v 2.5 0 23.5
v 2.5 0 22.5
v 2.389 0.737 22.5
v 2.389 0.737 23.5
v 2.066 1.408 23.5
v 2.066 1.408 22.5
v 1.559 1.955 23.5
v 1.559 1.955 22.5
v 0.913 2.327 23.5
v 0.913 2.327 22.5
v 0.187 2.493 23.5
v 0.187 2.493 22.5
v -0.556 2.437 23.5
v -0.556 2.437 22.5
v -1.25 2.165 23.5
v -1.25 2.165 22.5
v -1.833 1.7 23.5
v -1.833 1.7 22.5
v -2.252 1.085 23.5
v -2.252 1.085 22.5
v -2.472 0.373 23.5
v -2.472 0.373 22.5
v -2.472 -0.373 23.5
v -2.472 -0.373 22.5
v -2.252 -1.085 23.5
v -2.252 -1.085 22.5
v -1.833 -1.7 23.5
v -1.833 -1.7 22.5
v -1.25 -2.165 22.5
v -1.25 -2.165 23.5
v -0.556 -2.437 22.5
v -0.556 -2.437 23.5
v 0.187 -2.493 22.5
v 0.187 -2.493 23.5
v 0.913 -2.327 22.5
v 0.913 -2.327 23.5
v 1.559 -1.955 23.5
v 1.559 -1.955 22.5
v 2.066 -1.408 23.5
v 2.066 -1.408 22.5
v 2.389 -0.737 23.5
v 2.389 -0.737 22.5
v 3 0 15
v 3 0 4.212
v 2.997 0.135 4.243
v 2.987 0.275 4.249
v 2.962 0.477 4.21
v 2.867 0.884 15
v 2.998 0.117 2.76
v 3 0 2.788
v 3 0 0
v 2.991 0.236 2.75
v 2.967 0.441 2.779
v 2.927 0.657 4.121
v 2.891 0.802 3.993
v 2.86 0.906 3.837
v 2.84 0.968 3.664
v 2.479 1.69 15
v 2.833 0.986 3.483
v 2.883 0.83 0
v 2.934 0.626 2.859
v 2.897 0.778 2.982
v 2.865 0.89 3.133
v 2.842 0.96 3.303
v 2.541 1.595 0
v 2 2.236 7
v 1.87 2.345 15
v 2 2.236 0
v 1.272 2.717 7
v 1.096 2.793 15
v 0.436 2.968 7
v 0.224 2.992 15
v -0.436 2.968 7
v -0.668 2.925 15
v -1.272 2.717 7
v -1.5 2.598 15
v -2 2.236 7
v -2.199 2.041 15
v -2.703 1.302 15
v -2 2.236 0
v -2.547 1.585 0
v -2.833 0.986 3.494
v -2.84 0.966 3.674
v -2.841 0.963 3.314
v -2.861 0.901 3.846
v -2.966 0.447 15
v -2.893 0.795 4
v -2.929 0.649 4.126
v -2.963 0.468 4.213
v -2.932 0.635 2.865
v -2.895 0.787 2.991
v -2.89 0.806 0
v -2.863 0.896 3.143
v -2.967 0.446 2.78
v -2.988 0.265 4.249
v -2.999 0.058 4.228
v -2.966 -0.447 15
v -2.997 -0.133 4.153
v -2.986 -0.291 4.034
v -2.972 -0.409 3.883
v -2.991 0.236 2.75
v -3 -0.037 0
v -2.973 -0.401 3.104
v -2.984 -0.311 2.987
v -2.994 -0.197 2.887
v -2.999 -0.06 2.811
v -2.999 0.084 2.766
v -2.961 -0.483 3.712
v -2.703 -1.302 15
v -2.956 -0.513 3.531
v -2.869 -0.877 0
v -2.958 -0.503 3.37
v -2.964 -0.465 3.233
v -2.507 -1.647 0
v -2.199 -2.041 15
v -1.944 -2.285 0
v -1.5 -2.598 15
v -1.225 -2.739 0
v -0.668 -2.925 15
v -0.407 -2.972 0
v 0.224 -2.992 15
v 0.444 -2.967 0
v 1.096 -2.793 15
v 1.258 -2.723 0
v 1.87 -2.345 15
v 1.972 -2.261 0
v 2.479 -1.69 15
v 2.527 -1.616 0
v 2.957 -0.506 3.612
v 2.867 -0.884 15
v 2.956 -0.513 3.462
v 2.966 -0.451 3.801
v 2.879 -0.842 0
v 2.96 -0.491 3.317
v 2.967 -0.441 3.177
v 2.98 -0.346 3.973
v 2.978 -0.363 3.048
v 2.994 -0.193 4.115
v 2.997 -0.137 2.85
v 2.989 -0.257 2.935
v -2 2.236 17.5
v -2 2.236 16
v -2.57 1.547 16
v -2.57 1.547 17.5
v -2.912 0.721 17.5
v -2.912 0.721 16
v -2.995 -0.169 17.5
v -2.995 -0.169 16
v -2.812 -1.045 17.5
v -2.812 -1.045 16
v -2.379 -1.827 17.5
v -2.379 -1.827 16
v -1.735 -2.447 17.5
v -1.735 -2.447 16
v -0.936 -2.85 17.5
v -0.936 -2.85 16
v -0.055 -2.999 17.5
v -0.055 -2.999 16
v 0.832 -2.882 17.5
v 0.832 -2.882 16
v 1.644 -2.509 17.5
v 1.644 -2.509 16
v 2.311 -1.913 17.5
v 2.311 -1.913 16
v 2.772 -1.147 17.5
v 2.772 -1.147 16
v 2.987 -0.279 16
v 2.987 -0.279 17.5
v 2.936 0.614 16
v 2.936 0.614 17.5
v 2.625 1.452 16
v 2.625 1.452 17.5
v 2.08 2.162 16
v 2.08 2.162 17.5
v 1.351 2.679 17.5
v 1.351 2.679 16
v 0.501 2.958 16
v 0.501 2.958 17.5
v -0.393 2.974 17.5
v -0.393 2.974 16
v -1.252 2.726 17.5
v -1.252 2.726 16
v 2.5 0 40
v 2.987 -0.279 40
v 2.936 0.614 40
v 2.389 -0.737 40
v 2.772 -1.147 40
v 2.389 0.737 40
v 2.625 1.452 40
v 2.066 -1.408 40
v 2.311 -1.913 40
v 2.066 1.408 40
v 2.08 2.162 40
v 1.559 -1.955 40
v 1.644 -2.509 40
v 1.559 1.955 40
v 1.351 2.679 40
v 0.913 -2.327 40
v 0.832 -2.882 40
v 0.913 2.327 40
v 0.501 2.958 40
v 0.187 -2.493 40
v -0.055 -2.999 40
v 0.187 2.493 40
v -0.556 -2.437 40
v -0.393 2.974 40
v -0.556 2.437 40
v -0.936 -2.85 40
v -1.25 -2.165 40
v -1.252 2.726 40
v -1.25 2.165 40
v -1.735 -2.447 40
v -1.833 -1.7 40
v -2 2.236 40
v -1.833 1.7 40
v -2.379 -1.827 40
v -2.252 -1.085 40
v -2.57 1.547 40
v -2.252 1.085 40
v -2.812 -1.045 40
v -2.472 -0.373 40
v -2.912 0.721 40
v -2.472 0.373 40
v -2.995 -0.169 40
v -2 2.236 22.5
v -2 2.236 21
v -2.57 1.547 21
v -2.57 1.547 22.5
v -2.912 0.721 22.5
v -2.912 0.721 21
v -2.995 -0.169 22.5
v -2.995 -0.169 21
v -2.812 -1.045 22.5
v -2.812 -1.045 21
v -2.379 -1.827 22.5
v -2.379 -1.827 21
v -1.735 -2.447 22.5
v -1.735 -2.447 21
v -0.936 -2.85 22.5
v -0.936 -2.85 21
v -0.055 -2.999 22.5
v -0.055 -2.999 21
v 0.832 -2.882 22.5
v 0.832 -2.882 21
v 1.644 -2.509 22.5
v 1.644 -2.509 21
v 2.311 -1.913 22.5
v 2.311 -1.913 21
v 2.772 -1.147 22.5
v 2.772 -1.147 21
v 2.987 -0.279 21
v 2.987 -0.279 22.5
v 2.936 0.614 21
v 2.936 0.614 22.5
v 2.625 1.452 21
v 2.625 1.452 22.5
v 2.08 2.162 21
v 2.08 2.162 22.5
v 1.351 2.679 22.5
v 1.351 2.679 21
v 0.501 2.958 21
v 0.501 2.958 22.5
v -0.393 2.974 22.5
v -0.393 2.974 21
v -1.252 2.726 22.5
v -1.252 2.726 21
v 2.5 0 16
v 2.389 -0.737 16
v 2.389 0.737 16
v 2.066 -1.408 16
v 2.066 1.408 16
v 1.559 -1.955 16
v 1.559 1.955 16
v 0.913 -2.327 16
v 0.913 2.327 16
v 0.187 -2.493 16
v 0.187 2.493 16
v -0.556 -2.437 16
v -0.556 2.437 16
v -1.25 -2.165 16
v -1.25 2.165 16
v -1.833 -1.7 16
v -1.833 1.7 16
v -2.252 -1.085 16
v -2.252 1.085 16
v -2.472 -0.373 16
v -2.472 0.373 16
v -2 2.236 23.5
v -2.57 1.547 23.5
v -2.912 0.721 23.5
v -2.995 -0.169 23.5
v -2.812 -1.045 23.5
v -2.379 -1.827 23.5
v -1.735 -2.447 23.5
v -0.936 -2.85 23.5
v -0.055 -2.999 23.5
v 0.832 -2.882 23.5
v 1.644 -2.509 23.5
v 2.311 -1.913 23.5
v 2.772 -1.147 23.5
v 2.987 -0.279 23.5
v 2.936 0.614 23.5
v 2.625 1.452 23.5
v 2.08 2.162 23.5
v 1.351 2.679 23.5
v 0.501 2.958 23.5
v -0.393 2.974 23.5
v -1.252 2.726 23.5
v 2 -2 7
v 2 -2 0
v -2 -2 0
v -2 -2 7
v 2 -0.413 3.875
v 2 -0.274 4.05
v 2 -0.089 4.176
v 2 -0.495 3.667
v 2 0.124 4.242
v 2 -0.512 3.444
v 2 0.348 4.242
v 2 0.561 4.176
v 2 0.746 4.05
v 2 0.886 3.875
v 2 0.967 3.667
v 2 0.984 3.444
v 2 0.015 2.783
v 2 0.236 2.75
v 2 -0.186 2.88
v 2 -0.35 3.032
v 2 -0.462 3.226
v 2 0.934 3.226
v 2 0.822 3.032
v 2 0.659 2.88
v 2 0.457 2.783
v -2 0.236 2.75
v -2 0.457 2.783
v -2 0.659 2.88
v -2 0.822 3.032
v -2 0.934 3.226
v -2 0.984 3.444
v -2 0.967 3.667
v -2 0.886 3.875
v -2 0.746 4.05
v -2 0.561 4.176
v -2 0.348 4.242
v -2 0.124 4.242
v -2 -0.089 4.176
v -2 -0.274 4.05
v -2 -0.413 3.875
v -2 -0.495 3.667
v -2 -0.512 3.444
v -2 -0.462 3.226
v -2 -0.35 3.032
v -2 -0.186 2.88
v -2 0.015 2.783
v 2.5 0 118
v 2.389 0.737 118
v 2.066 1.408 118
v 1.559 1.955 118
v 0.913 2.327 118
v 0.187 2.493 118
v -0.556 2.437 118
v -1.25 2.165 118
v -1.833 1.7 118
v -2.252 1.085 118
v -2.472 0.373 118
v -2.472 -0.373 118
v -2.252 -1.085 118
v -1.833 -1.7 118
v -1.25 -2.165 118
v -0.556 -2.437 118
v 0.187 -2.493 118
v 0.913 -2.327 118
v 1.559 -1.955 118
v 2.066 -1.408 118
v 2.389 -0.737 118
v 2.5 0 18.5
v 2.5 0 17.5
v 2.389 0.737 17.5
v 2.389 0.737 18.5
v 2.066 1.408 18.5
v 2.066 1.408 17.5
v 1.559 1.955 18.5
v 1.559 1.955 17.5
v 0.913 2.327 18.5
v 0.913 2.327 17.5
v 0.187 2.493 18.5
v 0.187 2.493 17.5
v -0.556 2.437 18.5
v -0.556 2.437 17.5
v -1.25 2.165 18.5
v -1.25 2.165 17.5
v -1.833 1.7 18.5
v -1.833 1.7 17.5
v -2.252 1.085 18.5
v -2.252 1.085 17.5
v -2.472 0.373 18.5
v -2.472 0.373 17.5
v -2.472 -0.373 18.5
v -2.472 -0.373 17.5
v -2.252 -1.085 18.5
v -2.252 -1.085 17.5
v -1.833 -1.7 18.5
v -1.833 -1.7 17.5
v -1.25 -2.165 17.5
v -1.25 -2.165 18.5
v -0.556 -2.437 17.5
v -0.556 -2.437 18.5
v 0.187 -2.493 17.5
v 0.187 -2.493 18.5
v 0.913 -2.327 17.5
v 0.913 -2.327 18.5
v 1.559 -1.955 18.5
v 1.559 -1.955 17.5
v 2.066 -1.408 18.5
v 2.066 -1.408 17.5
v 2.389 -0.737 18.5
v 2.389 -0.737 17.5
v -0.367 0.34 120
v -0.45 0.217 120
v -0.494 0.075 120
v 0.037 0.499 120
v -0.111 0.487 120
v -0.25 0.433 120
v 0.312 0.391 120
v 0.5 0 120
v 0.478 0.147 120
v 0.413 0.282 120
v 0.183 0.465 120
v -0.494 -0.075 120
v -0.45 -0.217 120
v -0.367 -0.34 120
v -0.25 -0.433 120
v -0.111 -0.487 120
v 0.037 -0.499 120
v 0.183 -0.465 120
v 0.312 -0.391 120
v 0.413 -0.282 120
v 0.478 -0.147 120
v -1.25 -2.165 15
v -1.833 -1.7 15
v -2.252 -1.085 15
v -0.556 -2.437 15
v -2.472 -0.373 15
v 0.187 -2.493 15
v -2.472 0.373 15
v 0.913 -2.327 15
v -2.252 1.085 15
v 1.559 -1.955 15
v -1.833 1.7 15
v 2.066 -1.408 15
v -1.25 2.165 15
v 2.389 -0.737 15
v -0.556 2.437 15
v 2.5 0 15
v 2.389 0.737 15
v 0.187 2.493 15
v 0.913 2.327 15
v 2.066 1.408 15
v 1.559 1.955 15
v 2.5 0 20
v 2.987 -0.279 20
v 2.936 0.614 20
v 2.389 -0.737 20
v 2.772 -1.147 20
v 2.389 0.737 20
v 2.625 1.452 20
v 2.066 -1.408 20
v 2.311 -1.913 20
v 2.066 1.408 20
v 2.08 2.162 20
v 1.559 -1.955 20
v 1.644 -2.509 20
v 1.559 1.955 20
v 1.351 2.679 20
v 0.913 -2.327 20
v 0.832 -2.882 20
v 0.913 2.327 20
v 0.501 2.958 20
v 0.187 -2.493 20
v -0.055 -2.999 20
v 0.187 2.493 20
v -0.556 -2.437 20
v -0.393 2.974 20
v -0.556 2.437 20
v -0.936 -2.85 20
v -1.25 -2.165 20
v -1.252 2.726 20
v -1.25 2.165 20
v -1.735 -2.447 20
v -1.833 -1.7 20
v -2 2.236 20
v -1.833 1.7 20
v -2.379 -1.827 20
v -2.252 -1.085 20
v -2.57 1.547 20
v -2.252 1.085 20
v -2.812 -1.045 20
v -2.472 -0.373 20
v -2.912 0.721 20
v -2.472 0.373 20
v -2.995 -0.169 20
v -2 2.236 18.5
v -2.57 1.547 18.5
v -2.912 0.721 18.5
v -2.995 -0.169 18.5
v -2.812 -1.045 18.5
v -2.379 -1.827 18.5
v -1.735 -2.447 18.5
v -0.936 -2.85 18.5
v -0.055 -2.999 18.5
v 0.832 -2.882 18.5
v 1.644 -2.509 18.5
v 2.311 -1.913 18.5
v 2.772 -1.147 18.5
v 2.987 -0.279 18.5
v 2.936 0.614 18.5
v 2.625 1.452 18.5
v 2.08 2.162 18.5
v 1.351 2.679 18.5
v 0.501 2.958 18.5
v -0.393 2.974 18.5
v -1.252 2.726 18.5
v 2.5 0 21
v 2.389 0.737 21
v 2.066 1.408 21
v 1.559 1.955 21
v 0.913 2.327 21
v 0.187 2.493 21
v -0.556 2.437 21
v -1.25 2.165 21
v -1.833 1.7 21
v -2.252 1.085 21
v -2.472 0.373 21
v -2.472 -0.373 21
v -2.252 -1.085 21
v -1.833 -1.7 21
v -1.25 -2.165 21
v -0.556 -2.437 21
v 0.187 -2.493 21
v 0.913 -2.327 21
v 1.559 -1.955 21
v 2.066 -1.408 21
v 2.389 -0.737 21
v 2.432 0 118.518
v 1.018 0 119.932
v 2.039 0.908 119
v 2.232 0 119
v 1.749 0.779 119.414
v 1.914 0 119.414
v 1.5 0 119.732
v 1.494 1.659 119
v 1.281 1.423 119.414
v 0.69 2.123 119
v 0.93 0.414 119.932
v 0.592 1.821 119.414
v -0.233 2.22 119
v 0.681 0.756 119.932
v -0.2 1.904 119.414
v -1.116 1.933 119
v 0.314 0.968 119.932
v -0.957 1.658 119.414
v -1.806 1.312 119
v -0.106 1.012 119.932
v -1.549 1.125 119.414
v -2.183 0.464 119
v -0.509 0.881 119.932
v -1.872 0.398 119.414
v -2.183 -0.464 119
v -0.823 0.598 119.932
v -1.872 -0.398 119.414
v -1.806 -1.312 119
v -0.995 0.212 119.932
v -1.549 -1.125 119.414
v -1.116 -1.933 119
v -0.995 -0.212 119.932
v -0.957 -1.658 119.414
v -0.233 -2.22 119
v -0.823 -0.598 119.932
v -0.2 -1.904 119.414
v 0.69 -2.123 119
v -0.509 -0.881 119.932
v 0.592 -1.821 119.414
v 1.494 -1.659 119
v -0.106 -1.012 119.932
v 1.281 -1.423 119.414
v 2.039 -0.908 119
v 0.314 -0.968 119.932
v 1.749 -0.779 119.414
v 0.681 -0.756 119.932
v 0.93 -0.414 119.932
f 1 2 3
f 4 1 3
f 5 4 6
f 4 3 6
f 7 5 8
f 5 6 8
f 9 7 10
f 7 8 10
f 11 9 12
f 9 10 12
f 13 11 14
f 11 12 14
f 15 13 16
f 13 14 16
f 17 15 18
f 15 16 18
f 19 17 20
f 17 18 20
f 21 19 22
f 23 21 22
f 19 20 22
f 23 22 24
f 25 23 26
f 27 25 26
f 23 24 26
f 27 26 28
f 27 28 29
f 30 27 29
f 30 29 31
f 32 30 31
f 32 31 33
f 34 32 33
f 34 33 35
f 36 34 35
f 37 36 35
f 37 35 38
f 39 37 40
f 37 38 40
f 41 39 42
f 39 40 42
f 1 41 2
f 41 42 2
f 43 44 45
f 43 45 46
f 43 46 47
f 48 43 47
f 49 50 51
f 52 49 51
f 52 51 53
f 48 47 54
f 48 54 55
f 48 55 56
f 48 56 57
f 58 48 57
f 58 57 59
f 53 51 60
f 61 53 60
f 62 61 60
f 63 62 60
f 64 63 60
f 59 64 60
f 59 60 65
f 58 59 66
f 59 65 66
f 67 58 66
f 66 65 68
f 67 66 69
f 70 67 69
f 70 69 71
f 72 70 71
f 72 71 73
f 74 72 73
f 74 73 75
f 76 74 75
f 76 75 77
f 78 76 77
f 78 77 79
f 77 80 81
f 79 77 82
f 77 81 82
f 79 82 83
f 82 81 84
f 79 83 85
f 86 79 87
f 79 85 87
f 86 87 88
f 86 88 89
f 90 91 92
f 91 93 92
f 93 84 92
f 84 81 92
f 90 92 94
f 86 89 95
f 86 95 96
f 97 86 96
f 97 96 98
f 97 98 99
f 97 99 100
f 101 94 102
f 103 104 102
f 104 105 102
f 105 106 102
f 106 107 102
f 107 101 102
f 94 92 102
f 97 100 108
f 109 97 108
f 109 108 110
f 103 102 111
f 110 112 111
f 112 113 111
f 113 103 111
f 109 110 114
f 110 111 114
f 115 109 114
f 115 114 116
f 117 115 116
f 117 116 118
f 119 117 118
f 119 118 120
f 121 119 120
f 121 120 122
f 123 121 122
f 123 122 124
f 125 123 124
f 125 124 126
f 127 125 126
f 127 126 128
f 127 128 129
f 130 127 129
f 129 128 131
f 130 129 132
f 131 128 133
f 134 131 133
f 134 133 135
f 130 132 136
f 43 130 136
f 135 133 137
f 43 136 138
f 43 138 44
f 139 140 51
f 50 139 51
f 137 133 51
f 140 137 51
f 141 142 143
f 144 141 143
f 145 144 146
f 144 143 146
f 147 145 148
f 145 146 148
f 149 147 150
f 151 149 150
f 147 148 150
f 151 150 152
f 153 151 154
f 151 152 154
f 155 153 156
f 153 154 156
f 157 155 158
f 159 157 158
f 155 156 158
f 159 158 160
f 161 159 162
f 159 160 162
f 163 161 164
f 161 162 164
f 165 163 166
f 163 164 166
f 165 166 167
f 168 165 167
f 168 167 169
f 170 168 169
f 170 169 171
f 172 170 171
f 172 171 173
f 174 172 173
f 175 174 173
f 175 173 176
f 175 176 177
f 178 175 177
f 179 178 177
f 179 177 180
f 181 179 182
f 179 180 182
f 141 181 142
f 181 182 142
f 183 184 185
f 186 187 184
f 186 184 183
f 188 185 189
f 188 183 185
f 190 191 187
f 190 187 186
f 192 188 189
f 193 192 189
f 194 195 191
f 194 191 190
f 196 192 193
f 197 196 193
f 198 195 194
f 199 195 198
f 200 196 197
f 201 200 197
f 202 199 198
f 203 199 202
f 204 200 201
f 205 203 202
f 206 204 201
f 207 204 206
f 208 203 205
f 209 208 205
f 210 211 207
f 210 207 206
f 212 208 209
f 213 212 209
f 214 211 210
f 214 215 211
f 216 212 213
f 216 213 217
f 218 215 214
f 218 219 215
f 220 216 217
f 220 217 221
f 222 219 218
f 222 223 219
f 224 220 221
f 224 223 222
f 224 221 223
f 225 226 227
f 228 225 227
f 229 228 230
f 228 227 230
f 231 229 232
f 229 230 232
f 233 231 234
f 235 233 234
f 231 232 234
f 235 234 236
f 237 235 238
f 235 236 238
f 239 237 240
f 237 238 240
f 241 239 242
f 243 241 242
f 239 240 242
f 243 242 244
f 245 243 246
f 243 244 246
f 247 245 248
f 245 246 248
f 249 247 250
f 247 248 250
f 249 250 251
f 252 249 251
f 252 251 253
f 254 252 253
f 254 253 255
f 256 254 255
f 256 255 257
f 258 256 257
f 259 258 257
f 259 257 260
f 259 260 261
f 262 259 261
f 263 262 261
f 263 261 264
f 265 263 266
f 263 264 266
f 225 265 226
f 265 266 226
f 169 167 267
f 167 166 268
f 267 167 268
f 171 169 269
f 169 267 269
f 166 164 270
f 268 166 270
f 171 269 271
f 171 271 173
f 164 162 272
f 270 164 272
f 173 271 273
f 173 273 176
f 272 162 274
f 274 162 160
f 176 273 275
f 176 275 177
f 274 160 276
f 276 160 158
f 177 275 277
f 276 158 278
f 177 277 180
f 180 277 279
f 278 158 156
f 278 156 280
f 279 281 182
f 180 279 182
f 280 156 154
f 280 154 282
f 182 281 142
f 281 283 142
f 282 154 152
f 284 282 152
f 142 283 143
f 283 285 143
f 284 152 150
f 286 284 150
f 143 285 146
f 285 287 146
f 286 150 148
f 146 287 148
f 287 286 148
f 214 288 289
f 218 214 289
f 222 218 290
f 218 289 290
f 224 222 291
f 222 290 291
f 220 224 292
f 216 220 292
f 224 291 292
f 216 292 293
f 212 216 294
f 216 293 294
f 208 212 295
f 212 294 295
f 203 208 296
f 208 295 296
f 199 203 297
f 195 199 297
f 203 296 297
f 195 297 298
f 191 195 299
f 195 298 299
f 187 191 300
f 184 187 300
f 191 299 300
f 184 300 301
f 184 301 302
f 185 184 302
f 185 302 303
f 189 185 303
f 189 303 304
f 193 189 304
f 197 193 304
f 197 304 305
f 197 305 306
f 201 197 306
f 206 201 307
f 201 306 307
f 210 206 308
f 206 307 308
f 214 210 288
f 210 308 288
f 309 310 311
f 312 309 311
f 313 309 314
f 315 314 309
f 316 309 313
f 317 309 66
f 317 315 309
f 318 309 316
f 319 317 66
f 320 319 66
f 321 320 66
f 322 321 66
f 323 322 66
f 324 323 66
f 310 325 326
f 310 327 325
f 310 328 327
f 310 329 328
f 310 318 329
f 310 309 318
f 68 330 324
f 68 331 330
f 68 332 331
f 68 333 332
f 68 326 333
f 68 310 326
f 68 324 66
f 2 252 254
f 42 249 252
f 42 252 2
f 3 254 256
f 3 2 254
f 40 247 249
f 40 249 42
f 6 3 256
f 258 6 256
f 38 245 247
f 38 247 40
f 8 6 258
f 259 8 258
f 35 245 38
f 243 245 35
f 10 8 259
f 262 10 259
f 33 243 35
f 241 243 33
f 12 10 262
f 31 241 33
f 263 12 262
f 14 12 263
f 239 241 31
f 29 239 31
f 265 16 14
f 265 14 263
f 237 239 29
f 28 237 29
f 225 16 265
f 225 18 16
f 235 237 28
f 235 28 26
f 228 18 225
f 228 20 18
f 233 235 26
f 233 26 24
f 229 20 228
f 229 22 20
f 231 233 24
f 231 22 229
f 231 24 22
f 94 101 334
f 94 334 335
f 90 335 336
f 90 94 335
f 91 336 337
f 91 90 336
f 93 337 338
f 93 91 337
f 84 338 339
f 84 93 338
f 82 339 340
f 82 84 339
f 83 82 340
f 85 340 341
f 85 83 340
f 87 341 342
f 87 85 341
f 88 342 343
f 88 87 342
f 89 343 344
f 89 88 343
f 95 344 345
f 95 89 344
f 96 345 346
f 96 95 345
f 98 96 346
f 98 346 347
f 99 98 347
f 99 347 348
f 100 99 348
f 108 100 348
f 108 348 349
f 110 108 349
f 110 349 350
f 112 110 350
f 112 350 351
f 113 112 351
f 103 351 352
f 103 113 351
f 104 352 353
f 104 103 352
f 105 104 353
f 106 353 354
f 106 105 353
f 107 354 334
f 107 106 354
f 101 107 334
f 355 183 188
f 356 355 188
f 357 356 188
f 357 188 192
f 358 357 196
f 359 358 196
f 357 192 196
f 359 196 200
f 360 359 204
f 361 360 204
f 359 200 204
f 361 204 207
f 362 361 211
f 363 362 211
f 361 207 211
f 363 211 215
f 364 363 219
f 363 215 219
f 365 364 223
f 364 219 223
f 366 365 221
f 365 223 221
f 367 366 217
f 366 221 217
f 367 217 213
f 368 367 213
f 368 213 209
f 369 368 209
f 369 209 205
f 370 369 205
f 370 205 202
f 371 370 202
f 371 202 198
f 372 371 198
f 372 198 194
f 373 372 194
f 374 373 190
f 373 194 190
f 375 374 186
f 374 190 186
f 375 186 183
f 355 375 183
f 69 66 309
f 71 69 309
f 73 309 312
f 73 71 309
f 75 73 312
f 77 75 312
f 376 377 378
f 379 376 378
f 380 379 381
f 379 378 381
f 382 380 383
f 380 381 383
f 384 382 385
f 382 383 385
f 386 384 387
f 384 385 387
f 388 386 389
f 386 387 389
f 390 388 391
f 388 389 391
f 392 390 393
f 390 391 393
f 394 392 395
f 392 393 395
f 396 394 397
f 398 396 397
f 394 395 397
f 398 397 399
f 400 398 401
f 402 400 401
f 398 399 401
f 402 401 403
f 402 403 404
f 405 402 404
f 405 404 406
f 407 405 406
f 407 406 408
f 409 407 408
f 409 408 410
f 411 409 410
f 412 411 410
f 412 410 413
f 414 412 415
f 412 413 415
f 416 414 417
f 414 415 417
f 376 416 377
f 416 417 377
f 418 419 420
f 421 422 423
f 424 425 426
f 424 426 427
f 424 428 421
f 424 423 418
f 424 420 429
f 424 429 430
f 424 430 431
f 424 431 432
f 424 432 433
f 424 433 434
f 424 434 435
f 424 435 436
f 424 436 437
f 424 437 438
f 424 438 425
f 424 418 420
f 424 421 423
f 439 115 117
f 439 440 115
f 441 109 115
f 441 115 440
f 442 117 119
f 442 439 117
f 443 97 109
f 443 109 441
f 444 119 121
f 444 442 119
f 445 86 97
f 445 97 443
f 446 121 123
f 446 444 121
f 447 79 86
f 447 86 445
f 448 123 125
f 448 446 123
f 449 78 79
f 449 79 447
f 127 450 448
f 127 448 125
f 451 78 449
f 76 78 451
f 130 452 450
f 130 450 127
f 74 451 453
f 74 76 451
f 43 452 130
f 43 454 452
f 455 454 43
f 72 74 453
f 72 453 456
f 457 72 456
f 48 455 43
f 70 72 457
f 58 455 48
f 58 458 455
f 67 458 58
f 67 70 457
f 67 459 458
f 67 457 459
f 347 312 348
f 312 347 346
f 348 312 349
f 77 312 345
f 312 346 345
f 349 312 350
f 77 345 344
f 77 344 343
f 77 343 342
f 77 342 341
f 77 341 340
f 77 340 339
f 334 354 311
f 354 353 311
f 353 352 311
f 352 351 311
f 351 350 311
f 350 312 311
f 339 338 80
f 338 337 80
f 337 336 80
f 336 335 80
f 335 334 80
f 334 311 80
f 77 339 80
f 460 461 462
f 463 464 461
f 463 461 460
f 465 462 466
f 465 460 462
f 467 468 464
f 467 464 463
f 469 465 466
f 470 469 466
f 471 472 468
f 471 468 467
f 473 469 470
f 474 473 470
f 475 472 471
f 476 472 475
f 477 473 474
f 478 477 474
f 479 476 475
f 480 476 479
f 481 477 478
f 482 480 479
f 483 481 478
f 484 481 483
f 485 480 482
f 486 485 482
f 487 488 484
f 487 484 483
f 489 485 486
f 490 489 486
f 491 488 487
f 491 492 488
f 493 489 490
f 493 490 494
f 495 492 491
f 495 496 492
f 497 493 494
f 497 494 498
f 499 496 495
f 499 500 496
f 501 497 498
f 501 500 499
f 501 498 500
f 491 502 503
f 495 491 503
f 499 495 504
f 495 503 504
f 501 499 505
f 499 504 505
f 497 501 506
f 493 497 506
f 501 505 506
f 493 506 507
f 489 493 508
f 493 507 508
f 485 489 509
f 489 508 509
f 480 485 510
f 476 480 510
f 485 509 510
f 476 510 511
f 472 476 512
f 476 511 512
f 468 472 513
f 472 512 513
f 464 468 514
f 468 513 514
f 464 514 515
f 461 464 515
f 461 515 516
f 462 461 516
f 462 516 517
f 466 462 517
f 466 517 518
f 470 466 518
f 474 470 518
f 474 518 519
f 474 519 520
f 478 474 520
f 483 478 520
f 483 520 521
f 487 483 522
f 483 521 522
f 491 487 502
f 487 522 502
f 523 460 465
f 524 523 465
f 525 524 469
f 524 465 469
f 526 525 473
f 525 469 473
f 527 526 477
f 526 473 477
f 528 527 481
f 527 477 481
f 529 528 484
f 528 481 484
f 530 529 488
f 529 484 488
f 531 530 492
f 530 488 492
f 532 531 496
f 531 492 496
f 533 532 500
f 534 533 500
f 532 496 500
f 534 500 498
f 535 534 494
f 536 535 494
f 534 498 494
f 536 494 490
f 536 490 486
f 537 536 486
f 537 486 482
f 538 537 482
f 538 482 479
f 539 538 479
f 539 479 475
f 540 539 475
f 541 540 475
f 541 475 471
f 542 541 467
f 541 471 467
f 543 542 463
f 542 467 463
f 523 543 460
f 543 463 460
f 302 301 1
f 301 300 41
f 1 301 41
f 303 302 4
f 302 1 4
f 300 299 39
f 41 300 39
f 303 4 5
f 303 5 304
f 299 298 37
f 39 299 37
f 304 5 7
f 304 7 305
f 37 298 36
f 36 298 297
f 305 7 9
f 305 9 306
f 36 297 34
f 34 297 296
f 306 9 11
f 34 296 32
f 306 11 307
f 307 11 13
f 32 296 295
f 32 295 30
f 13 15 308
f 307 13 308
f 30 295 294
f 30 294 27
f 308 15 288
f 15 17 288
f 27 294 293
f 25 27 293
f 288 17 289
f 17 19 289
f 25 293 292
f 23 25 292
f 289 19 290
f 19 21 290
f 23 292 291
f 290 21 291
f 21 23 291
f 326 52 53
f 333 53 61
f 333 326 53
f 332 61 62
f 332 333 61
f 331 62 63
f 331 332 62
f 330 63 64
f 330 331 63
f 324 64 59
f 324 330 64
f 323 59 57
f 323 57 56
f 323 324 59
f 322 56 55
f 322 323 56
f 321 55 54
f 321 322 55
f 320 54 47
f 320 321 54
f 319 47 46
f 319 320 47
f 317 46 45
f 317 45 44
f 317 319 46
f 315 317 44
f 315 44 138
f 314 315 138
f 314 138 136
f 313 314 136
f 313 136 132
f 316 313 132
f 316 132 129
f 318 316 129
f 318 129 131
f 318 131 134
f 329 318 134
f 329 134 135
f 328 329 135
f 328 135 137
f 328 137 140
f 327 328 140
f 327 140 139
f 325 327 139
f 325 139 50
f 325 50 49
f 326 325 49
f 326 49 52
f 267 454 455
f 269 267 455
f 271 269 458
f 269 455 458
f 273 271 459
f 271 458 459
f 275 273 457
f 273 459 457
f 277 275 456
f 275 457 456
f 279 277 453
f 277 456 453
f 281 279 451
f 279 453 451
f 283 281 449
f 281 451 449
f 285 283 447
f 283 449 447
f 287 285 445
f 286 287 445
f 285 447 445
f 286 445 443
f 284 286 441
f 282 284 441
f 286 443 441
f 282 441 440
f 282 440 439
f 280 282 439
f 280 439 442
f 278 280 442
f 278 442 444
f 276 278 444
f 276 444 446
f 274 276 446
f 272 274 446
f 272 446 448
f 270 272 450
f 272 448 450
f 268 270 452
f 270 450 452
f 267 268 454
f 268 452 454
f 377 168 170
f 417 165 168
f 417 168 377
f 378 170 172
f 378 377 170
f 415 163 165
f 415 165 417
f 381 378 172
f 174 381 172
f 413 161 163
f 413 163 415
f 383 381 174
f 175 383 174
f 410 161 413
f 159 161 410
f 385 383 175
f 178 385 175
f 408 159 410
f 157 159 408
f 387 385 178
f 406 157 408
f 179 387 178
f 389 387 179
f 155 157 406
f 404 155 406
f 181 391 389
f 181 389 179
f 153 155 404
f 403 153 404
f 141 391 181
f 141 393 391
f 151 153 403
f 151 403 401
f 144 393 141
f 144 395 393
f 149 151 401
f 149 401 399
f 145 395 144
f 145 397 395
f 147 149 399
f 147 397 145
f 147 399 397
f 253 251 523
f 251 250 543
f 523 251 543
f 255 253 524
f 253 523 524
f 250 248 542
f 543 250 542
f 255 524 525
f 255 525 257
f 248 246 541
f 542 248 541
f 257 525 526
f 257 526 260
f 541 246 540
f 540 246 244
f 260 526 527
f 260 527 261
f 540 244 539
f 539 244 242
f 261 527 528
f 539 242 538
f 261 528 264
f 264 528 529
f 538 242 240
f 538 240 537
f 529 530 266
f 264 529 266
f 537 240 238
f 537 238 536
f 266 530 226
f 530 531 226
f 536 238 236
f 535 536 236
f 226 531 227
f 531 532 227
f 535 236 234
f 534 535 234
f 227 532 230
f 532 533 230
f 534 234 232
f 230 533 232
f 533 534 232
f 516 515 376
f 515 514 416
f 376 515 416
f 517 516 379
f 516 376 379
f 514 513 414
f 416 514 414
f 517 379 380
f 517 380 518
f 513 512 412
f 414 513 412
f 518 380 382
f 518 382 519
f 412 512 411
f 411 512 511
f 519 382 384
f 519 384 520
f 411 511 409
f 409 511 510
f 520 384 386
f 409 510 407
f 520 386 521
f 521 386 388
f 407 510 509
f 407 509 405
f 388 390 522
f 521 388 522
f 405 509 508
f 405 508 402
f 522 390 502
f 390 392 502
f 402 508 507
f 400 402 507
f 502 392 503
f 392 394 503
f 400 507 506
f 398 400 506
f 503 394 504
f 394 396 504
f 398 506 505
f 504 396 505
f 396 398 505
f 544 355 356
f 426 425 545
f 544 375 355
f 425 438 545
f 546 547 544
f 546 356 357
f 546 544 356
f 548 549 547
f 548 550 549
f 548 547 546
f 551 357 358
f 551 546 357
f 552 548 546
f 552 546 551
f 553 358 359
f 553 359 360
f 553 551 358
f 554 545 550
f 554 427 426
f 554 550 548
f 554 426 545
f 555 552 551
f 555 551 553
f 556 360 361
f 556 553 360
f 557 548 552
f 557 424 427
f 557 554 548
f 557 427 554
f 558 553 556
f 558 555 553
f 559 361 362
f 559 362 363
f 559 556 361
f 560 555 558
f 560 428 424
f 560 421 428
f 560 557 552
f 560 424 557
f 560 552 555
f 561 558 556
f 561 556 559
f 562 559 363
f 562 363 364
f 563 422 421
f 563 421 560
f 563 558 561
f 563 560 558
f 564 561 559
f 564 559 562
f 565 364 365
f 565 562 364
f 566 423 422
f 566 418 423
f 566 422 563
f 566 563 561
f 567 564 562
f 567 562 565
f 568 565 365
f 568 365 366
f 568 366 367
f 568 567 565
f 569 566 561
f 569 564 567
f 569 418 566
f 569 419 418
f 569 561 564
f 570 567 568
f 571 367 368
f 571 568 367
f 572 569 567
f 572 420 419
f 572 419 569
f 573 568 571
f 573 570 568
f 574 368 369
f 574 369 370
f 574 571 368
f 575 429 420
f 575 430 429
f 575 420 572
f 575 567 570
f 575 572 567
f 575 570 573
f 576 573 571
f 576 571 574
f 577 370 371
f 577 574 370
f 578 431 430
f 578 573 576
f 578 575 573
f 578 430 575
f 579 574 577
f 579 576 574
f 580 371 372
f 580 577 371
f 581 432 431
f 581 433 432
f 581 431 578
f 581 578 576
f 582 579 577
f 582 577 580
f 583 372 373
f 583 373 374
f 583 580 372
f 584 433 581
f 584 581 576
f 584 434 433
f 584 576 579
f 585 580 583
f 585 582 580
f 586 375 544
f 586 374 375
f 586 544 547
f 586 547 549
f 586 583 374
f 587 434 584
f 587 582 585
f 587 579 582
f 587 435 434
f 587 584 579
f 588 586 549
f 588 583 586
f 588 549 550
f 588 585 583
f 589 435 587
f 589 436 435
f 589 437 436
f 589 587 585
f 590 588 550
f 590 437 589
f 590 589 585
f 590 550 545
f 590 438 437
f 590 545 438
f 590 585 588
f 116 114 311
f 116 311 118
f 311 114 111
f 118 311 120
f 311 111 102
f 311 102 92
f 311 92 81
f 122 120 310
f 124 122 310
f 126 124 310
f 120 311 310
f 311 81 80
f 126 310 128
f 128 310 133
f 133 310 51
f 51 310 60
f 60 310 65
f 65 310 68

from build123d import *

# Parameters (mm, degrees)
SKETCH2_R               = 3
BOSS_EXTRUDE1_DEPTH     = 15
SKETCH3_W               = 4
SKETCH3_H               = 5.183202584
CUT_EXTRUDE1_DEPTH      = 7
CUT_EXTRUDE4_DEPTH      = 6
CUT_EXTRUDE4_DEPTH_BACK = 3
SKETCH4_R               = 0.75
SKETCH12_R              = 2.5
BOSS_EXTRUDE2_DEPTH     = 1
SKETCH13_R              = 3
BOSS_EXTRUDE3_DEPTH     = 1.5
SKETCH14_R              = 2.5
BOSS_EXTRUDE4_DEPTH     = 1
SKETCH15_R              = 3
BOSS_EXTRUDE5_DEPTH     = 1.5
SKETCH16_R              = 2.5
BOSS_EXTRUDE6_DEPTH     = 1
SKETCH17_R              = 3
BOSS_EXTRUDE7_DEPTH     = 1.5
SKETCH18_R              = 2.5
BOSS_EXTRUDE8_DEPTH     = 1
SKETCH19_R              = 3
BOSS_EXTRUDE9_DEPTH     = 16.5
SKETCH28_R              = 2.5
BOSS_EXTRUDE11_DEPTH    = 80
FILLET6_R               = 2


with BuildPart() as part:
    # Sketch2 → Boss-Extrude1 (new body)
    with BuildSketch(Plane.XY):
        Circle(SKETCH2_R)
    extrude(amount=BOSS_EXTRUDE1_DEPTH)

    # Sketch3 → Cut-Extrude1 (cut)
    with BuildSketch(Plane(origin=(0, 0, 0), x_dir=(-1, 0, 0), z_dir=(0, 0, -1))):
        with Locations((0, 0.591601292)):
            Rectangle(SKETCH3_W, SKETCH3_H)
    extrude(amount=-CUT_EXTRUDE1_DEPTH, mode=Mode.SUBTRACT)

    # Sketch4 → Cut-Extrude4 (cut, two sides: drawn at the far end of the back side and taken through both)
    with BuildSketch(Plane(origin=(-2, 0, 0), x_dir=(0, 0, -1), z_dir=(1, 0, 0)).offset(-CUT_EXTRUDE4_DEPTH_BACK)):
        with Locations((-3.5, 0.236067977)):
            Circle(SKETCH4_R)
    extrude(amount=CUT_EXTRUDE4_DEPTH + CUT_EXTRUDE4_DEPTH_BACK, mode=Mode.SUBTRACT)

    # Sketch12 → Boss-Extrude2 (add)
    with BuildSketch(Plane.XY.offset(15)):
        Circle(SKETCH12_R)
    extrude(amount=BOSS_EXTRUDE2_DEPTH)

    # Sketch13 → Boss-Extrude3 (add)
    with BuildSketch(Plane.XY.offset(16)):
        with Locations(Location((0, 0, 0), (0, 0, 131.810314896))):
            Circle(SKETCH13_R)
    extrude(amount=BOSS_EXTRUDE3_DEPTH)

    # Sketch14 → Boss-Extrude4 (add)
    with BuildSketch(Plane.XY.offset(17.5)):
        Circle(SKETCH14_R)
    extrude(amount=BOSS_EXTRUDE4_DEPTH)

    # Sketch15 → Boss-Extrude5 (add)
    with BuildSketch(Plane.XY.offset(18.5)):
        with Locations(Location((0, 0, 0), (0, 0, 131.810314896))):
            Circle(SKETCH15_R)
    extrude(amount=BOSS_EXTRUDE5_DEPTH)

    # Sketch16 → Boss-Extrude6 (add)
    with BuildSketch(Plane.XY.offset(20)):
        Circle(SKETCH16_R)
    extrude(amount=BOSS_EXTRUDE6_DEPTH)

    # Sketch17 → Boss-Extrude7 (add)
    with BuildSketch(Plane.XY.offset(21)):
        with Locations(Location((0, 0, 0), (0, 0, 131.810314896))):
            Circle(SKETCH17_R)
    extrude(amount=BOSS_EXTRUDE7_DEPTH)

    # Sketch18 → Boss-Extrude8 (add)
    with BuildSketch(Plane.XY.offset(22.5)):
        Circle(SKETCH18_R)
    extrude(amount=BOSS_EXTRUDE8_DEPTH)

    # Sketch19 → Boss-Extrude9 (add)
    with BuildSketch(Plane.XY.offset(23.5)):
        with Locations(Location((0, 0, 0), (0, 0, 131.810314896))):
            Circle(SKETCH19_R)
    extrude(amount=BOSS_EXTRUDE9_DEPTH)

    # Sketch28 → Boss-Extrude11 (add)
    with BuildSketch(Plane.XY.offset(40)):
        Circle(SKETCH28_R)
    extrude(amount=BOSS_EXTRUDE11_DEPTH)

    # Fillet6
    fillet6_edges = [part.edges().sort_by_distance(p)[0] for p in [
        (-2.5, 0, 120),
    ]]
    fillet(fillet6_edges, radius=FILLET6_R)


solid = part.part
